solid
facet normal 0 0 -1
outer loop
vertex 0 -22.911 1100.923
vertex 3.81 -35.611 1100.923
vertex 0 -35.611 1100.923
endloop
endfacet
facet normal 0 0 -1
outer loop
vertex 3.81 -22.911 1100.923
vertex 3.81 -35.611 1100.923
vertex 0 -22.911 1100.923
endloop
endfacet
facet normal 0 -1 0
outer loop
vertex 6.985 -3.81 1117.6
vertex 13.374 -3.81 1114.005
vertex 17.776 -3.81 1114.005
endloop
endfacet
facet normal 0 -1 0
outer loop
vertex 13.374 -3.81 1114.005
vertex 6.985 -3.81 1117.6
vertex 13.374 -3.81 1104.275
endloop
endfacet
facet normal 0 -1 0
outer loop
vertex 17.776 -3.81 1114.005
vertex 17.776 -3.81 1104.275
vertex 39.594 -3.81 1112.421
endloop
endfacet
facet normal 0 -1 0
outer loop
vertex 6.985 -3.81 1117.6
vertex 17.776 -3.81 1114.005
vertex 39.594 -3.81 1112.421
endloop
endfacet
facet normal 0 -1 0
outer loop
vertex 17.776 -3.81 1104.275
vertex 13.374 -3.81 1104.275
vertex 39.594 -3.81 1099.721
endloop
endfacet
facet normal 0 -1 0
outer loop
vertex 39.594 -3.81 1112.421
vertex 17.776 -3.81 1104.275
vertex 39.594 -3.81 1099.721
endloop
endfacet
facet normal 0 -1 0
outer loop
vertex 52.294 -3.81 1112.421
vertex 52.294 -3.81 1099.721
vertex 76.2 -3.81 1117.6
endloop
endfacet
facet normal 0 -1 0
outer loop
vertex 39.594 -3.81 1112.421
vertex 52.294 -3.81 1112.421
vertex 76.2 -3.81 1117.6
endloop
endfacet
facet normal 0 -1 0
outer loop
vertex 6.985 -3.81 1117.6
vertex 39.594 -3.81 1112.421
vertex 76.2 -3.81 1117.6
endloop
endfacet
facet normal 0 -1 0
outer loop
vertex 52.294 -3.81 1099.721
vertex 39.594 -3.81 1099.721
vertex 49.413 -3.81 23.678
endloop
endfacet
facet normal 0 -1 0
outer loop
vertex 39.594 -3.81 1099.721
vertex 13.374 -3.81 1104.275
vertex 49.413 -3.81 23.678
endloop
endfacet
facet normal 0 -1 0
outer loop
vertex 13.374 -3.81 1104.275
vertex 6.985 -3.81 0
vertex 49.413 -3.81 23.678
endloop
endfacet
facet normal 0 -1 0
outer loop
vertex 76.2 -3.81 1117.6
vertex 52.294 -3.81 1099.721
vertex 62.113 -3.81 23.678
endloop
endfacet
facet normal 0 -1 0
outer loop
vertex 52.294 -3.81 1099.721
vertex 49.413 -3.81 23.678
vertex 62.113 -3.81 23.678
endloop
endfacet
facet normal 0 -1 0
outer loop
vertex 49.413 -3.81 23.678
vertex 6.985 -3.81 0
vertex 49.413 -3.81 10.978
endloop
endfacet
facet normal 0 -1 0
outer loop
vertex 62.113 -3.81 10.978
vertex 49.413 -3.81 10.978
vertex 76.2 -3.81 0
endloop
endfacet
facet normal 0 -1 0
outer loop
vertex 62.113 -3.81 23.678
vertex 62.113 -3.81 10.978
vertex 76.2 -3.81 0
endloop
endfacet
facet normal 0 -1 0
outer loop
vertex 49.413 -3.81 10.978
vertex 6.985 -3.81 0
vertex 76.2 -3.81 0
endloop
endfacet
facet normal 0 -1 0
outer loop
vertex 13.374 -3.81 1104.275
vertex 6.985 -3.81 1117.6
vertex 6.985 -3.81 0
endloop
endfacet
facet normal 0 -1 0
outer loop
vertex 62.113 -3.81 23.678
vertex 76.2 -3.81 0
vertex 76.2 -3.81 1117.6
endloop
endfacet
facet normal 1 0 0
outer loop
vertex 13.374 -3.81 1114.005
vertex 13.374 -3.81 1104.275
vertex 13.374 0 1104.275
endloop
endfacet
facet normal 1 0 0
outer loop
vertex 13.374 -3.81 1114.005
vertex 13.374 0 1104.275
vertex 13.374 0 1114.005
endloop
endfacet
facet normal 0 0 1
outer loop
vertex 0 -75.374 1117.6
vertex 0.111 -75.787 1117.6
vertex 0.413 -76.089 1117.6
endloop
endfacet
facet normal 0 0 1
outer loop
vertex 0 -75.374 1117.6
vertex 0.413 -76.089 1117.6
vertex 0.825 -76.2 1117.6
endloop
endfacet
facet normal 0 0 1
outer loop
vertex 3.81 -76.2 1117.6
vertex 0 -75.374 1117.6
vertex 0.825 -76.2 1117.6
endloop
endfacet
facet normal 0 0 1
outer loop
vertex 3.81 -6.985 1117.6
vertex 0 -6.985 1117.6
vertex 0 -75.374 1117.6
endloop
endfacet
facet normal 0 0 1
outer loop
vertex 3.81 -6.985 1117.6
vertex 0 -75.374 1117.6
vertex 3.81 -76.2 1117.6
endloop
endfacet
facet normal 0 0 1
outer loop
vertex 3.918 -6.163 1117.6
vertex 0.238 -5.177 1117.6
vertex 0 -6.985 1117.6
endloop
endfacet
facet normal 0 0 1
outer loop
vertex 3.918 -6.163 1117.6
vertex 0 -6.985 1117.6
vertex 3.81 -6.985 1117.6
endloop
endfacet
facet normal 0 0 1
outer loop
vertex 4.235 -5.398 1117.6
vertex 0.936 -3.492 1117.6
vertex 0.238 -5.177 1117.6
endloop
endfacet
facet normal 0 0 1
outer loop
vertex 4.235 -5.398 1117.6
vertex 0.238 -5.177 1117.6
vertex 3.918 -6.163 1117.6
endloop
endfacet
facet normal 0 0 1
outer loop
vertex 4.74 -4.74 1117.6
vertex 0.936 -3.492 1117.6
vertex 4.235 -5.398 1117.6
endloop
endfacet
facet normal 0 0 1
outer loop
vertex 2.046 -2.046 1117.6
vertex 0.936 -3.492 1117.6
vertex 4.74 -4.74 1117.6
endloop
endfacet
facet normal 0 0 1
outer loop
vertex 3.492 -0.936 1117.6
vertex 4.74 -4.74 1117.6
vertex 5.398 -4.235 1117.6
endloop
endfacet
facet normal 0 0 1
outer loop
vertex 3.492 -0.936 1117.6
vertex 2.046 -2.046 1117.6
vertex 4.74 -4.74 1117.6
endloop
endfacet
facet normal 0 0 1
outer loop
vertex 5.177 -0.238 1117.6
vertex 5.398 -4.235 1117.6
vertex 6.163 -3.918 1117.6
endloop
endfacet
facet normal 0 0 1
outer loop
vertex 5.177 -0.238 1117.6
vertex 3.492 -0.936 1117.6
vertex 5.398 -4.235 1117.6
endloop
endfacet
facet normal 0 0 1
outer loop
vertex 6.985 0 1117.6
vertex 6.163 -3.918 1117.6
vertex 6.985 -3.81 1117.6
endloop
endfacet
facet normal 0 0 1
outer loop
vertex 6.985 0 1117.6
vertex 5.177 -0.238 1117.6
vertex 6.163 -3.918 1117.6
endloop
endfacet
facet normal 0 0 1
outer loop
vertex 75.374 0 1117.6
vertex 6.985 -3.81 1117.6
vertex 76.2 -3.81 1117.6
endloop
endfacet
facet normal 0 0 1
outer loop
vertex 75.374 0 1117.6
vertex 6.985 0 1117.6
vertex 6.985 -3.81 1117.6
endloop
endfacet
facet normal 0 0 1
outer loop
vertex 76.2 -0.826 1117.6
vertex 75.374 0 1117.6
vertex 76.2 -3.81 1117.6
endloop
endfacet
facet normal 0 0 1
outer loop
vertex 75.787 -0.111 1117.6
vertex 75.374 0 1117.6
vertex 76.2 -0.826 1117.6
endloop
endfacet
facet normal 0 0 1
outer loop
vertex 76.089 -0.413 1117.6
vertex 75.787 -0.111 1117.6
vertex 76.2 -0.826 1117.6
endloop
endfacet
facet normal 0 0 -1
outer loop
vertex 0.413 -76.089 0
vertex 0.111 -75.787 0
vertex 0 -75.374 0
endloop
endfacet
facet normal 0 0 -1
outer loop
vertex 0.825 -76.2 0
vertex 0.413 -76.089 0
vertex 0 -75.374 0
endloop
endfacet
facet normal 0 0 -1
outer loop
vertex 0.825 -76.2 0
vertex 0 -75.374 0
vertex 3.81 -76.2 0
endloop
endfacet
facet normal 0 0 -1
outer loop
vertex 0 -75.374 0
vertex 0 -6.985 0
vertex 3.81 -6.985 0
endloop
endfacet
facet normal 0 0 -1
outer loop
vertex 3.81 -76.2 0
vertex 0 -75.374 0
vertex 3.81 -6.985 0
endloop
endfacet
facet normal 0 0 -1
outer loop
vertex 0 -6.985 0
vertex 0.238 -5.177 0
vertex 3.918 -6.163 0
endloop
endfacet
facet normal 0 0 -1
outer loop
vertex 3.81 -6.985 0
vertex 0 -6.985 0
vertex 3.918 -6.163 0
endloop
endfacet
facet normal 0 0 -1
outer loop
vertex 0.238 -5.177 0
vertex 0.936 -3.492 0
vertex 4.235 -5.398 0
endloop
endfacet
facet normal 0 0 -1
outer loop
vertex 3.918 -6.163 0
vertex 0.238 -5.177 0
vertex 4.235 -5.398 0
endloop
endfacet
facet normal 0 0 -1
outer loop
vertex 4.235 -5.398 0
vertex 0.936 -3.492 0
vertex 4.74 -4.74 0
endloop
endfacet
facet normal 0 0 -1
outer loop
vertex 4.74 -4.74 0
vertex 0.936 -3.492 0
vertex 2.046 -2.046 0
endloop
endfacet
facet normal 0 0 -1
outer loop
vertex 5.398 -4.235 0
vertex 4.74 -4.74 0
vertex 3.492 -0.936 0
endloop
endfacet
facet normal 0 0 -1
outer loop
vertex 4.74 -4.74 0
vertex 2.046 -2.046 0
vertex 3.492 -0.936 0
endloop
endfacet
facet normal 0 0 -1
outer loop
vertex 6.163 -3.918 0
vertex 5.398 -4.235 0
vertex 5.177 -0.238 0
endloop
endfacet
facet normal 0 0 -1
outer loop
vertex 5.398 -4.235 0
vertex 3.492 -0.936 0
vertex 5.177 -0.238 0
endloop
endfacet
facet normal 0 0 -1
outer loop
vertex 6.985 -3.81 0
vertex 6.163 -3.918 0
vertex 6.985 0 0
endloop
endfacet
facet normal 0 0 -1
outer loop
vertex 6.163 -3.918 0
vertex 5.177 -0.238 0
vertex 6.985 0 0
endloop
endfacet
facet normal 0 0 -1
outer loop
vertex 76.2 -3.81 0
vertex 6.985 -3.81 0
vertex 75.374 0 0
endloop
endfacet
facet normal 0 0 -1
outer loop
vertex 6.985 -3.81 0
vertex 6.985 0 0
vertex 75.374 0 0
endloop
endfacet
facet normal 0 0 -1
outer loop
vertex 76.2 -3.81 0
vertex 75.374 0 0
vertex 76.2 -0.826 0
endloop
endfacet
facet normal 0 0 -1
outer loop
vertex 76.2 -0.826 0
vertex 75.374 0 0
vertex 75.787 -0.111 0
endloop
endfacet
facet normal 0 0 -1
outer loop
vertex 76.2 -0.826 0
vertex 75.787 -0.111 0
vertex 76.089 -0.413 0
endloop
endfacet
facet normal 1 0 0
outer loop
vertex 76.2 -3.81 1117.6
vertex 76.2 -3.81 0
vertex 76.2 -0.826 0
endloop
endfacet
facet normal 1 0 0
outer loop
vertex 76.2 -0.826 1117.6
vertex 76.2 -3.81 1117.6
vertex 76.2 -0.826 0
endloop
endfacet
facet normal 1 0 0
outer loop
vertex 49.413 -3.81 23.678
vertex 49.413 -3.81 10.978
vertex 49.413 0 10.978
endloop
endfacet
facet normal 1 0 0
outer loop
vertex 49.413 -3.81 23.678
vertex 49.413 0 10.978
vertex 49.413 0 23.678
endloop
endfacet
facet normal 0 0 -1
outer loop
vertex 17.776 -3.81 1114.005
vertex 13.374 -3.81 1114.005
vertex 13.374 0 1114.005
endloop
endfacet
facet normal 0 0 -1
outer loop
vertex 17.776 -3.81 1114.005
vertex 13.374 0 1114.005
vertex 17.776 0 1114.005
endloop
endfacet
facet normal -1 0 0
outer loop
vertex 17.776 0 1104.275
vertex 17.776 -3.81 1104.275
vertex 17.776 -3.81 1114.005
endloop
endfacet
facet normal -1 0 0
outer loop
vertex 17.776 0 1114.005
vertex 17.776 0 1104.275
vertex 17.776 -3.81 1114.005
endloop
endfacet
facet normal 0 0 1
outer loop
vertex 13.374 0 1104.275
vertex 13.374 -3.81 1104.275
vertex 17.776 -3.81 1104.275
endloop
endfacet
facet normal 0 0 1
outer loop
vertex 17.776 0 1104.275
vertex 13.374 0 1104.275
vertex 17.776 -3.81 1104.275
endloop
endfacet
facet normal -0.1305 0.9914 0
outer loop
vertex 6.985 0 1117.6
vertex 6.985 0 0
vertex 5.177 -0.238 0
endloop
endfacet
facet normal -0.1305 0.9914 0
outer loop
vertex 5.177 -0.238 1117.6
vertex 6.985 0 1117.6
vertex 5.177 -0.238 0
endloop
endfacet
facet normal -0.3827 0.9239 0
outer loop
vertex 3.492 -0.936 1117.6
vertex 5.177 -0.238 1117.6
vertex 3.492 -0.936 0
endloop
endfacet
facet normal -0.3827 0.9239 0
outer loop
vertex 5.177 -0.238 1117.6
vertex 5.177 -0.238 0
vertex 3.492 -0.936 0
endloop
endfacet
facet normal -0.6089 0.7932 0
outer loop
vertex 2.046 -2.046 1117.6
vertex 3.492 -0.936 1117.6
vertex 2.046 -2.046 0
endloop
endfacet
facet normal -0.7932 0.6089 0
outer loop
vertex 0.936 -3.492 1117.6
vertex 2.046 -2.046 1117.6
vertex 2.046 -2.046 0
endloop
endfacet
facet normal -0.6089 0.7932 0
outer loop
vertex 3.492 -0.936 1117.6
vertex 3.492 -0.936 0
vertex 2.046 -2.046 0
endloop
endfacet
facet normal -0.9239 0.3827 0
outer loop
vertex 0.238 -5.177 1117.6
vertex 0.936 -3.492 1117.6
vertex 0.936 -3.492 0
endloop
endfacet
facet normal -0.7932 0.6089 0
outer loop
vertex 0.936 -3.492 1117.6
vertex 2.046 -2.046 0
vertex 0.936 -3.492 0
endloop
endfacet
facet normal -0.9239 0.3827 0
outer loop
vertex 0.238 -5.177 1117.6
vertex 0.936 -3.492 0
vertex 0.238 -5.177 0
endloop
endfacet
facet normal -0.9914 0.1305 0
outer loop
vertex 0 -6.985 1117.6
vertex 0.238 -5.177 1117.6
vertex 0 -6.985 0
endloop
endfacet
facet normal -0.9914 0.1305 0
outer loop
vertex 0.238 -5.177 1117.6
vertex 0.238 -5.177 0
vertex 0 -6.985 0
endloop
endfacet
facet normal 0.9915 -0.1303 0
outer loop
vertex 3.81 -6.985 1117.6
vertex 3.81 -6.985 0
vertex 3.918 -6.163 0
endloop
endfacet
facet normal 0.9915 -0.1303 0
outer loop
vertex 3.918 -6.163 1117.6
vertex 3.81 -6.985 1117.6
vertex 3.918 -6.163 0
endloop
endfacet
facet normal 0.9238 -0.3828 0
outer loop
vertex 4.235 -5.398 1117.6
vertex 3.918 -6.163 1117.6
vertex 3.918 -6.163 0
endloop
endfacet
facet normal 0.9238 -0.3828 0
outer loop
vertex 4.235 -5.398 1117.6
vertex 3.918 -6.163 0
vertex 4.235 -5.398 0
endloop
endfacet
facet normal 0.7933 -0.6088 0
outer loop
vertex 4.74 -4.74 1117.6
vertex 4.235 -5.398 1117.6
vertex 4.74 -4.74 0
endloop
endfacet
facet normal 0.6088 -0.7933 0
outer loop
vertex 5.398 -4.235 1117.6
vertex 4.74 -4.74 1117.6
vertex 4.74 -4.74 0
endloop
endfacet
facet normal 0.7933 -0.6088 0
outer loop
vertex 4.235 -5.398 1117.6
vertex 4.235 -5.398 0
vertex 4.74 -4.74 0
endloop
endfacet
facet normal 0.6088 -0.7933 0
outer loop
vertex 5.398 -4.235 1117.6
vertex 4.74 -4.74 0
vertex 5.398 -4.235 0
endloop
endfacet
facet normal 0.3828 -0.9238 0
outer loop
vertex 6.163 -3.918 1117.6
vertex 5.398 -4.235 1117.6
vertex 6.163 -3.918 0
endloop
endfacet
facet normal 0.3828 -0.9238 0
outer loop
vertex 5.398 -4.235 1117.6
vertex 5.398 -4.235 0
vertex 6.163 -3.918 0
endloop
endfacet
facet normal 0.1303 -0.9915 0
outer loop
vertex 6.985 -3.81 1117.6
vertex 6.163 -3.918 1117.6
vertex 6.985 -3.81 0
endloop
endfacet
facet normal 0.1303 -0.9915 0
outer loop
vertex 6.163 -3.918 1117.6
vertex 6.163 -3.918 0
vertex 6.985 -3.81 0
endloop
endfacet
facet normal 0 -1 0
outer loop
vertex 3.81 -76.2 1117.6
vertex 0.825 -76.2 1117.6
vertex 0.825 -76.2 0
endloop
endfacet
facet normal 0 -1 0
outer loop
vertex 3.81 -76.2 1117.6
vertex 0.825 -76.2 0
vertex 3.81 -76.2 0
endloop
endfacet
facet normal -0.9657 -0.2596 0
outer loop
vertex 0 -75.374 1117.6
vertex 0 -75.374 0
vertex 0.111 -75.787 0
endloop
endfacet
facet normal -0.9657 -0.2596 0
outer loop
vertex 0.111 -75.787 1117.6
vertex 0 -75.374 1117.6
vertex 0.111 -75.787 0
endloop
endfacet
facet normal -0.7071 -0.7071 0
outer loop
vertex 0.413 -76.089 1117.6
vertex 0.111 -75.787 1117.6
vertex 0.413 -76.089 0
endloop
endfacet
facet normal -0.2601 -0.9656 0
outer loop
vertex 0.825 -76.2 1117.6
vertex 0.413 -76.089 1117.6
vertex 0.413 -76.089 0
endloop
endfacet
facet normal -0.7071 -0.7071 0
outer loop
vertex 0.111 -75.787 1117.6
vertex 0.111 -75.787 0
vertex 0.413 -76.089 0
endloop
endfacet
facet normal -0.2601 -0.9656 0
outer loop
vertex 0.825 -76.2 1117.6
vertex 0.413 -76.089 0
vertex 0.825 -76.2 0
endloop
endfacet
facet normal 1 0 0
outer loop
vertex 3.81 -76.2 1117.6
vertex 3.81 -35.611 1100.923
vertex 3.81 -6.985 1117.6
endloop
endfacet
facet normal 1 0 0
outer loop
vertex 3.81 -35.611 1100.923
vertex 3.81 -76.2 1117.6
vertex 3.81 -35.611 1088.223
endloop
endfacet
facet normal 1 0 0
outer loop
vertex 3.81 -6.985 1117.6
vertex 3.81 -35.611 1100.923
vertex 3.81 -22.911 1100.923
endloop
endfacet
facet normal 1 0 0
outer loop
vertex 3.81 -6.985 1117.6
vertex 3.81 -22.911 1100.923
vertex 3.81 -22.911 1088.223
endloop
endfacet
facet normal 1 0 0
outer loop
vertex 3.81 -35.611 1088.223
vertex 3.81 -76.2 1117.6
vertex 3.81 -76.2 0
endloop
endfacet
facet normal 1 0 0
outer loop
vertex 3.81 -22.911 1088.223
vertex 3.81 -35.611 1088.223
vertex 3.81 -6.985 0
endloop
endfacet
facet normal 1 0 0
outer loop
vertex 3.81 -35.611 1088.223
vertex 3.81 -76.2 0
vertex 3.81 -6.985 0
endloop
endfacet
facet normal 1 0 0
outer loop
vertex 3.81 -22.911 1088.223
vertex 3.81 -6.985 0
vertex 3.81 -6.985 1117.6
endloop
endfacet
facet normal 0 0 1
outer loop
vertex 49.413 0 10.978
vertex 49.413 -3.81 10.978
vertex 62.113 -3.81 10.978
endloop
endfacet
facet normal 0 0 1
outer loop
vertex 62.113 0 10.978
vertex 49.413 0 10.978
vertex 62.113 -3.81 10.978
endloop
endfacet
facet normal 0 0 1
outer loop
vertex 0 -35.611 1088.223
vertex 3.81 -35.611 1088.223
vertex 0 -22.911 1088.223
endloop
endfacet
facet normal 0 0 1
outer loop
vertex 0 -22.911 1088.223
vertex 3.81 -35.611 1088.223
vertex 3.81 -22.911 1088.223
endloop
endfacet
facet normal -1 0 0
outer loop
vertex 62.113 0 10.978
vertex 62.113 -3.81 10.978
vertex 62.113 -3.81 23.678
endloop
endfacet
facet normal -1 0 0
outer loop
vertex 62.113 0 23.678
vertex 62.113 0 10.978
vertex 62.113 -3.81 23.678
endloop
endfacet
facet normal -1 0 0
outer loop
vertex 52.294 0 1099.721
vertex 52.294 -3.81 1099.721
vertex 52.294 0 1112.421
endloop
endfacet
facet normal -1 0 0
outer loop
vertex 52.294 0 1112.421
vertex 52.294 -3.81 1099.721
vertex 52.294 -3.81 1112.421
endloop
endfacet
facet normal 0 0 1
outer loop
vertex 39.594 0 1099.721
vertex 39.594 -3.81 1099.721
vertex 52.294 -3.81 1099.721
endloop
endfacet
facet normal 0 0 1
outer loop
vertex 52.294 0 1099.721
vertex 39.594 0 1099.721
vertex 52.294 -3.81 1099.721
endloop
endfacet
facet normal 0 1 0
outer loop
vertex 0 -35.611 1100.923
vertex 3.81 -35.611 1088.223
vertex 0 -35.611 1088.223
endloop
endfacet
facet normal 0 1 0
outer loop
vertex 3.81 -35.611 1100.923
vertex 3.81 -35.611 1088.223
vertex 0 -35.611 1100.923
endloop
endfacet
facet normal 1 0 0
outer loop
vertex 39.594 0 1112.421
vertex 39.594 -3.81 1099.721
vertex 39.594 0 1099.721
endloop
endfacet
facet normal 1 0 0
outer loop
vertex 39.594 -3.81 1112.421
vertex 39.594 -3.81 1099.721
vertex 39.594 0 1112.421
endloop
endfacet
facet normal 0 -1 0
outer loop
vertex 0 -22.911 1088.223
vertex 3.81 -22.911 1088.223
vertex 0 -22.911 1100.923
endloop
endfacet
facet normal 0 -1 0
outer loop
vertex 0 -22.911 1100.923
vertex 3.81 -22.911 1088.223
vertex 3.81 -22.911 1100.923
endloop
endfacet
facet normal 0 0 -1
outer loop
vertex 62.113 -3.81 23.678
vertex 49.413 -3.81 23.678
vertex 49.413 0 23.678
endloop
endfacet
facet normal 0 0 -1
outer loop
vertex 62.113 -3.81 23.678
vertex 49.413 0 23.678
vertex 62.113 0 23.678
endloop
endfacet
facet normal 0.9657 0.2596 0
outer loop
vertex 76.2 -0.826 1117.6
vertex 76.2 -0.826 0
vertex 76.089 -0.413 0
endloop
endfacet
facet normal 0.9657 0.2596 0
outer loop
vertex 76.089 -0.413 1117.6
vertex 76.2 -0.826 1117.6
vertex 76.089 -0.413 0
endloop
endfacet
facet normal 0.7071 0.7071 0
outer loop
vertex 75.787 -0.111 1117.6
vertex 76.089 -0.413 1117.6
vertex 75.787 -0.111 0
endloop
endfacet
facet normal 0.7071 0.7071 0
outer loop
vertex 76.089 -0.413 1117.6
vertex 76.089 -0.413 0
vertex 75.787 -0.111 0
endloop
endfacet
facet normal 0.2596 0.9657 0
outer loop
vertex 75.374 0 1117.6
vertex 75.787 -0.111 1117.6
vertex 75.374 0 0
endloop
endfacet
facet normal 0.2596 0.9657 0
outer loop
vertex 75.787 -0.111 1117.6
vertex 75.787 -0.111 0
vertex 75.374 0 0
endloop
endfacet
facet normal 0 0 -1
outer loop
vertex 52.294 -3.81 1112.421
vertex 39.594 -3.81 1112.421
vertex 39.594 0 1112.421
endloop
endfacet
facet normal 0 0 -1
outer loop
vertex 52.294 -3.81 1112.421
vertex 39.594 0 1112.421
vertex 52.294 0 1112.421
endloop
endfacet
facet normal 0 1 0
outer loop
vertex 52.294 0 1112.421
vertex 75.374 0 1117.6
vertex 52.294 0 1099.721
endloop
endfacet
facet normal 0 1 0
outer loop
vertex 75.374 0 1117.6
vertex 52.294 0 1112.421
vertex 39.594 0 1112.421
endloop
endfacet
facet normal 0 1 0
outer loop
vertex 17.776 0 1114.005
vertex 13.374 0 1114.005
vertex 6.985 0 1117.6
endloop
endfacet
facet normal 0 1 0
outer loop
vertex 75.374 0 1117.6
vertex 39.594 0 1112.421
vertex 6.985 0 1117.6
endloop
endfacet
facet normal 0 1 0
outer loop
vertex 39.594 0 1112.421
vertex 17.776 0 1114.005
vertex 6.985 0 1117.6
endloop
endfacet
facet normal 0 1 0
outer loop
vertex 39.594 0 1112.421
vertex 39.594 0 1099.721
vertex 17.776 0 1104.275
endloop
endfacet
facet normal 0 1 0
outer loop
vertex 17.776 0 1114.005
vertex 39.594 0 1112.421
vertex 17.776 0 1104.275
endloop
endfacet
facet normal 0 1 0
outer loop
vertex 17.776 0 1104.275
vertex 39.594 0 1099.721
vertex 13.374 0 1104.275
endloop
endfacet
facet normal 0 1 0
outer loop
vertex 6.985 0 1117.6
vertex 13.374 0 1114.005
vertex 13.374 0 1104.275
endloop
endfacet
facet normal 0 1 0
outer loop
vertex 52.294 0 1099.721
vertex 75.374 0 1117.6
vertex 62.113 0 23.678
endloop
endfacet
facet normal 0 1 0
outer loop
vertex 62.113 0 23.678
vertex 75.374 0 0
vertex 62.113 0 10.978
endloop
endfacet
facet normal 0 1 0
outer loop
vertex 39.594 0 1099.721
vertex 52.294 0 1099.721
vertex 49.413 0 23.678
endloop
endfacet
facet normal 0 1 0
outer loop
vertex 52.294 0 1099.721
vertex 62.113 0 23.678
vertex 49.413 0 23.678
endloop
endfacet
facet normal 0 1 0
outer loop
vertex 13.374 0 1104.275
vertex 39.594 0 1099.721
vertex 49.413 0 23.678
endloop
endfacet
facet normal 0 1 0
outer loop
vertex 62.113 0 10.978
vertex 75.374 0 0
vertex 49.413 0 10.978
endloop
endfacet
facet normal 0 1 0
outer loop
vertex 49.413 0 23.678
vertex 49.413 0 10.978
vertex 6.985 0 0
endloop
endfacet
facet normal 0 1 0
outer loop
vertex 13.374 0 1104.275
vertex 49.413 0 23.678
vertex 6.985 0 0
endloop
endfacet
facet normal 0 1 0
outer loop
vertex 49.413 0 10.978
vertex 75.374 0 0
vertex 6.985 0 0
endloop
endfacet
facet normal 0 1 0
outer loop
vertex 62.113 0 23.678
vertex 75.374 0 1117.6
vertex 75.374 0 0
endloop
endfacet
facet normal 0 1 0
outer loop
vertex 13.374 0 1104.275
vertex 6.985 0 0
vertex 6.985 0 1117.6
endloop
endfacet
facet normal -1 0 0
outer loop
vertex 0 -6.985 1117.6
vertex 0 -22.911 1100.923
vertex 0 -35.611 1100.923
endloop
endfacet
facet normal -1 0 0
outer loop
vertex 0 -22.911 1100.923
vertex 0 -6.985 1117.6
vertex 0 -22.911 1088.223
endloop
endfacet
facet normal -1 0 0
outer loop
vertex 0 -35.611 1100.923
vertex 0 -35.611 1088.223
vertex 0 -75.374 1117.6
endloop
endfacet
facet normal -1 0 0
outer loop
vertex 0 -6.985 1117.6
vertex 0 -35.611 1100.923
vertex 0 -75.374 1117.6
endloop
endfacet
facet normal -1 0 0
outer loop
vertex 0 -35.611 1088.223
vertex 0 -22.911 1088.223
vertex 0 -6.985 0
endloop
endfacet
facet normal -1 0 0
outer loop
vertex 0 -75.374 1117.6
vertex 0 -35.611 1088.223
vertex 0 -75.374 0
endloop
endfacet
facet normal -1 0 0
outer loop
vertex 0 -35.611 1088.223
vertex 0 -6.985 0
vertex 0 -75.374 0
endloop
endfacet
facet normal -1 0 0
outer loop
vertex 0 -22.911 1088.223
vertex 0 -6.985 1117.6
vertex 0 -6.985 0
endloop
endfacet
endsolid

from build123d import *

# Parameters (mm, degrees)
F1_DEPTH  = 1117.6
F1_FACE_W = 69.215
F1_FACE_H = 1117.6
F2_DEPTH  = 12.7
F3_W      = 4.401298
F3_H      = 9.729863
F3_W_2    = 12.7
F3_H_2    = 12.7
F4_DEPTH  = 3.811
F5_W      = 12.7
F5_H      = 12.7
F6_DEPTH  = 3.811
F7_W      = 12.7
F7_H      = 12.7
F8_DEPTH  = 3.811


with BuildPart() as f1:
    # F0 (on Top) → F1 (new body)
    with BuildSketch(Plane.XY):
        with BuildLine():
            ThreePointArc((0, -75.3745), (0.241783, -75.958217), (0.8255, -76.2))
            Line((0.8255, -76.2), (3.81, -76.2))
            Line((3.81, -76.2), (3.81, -6.985))
            ThreePointArc((3.81, -6.985), (4.739936, -4.739936), (6.985, -3.81))
            Line((6.985, -3.81), (76.2, -3.81))
            Line((76.2, -3.81), (76.2, -0.8255))
            ThreePointArc((76.2, -0.8255), (75.958217, -0.241783), (75.3745, 0))
            Line((75.3745, 0), (6.985, 0))
            ThreePointArc((6.985, 0), (2.045859, -2.045859), (0, -6.985))
            Line((0, -6.985), (0, -75.3745))
        make_face()
    extrude(amount=F1_DEPTH)

    # F1_face (on face) → F2 (cut)
    with BuildSketch(Plane(origin=(41.5925, -3.81, 558.8), x_dir=(1, 0, 0), z_dir=(0, -1, 0))):
        Rectangle(F1_FACE_W, F1_FACE_H)
    extrude(amount=F2_DEPTH, mode=Mode.SUBTRACT)

    # F3 (on face) → F4 (cut, through all)
    with BuildSketch(Plane.XZ.offset(3.81)):
        with Locations((15.575112, 1109.140038)):
            Rectangle(F3_W, F3_H)
        with Locations((45.943957, 1106.071313)):
            Rectangle(F3_W_2, F3_H_2)
    extrude(amount=-F4_DEPTH, mode=Mode.SUBTRACT)

    # F5 (on face) → F6 (cut, through all)
    with BuildSketch(Plane.YZ.offset(3.81)):
        with Locations((-29.260806, 1094.573338)):
            Rectangle(F5_W, F5_H)
    extrude(amount=-F6_DEPTH, mode=Mode.SUBTRACT)

    # F7 (on face) → F8 (cut, through all)
    with BuildSketch(Plane.XZ.offset(3.81)):
        with Locations((55.762946, 17.327846)):
            Rectangle(F7_W, F7_H)
    extrude(amount=-F8_DEPTH, mode=Mode.SUBTRACT)


solid = f1.part
